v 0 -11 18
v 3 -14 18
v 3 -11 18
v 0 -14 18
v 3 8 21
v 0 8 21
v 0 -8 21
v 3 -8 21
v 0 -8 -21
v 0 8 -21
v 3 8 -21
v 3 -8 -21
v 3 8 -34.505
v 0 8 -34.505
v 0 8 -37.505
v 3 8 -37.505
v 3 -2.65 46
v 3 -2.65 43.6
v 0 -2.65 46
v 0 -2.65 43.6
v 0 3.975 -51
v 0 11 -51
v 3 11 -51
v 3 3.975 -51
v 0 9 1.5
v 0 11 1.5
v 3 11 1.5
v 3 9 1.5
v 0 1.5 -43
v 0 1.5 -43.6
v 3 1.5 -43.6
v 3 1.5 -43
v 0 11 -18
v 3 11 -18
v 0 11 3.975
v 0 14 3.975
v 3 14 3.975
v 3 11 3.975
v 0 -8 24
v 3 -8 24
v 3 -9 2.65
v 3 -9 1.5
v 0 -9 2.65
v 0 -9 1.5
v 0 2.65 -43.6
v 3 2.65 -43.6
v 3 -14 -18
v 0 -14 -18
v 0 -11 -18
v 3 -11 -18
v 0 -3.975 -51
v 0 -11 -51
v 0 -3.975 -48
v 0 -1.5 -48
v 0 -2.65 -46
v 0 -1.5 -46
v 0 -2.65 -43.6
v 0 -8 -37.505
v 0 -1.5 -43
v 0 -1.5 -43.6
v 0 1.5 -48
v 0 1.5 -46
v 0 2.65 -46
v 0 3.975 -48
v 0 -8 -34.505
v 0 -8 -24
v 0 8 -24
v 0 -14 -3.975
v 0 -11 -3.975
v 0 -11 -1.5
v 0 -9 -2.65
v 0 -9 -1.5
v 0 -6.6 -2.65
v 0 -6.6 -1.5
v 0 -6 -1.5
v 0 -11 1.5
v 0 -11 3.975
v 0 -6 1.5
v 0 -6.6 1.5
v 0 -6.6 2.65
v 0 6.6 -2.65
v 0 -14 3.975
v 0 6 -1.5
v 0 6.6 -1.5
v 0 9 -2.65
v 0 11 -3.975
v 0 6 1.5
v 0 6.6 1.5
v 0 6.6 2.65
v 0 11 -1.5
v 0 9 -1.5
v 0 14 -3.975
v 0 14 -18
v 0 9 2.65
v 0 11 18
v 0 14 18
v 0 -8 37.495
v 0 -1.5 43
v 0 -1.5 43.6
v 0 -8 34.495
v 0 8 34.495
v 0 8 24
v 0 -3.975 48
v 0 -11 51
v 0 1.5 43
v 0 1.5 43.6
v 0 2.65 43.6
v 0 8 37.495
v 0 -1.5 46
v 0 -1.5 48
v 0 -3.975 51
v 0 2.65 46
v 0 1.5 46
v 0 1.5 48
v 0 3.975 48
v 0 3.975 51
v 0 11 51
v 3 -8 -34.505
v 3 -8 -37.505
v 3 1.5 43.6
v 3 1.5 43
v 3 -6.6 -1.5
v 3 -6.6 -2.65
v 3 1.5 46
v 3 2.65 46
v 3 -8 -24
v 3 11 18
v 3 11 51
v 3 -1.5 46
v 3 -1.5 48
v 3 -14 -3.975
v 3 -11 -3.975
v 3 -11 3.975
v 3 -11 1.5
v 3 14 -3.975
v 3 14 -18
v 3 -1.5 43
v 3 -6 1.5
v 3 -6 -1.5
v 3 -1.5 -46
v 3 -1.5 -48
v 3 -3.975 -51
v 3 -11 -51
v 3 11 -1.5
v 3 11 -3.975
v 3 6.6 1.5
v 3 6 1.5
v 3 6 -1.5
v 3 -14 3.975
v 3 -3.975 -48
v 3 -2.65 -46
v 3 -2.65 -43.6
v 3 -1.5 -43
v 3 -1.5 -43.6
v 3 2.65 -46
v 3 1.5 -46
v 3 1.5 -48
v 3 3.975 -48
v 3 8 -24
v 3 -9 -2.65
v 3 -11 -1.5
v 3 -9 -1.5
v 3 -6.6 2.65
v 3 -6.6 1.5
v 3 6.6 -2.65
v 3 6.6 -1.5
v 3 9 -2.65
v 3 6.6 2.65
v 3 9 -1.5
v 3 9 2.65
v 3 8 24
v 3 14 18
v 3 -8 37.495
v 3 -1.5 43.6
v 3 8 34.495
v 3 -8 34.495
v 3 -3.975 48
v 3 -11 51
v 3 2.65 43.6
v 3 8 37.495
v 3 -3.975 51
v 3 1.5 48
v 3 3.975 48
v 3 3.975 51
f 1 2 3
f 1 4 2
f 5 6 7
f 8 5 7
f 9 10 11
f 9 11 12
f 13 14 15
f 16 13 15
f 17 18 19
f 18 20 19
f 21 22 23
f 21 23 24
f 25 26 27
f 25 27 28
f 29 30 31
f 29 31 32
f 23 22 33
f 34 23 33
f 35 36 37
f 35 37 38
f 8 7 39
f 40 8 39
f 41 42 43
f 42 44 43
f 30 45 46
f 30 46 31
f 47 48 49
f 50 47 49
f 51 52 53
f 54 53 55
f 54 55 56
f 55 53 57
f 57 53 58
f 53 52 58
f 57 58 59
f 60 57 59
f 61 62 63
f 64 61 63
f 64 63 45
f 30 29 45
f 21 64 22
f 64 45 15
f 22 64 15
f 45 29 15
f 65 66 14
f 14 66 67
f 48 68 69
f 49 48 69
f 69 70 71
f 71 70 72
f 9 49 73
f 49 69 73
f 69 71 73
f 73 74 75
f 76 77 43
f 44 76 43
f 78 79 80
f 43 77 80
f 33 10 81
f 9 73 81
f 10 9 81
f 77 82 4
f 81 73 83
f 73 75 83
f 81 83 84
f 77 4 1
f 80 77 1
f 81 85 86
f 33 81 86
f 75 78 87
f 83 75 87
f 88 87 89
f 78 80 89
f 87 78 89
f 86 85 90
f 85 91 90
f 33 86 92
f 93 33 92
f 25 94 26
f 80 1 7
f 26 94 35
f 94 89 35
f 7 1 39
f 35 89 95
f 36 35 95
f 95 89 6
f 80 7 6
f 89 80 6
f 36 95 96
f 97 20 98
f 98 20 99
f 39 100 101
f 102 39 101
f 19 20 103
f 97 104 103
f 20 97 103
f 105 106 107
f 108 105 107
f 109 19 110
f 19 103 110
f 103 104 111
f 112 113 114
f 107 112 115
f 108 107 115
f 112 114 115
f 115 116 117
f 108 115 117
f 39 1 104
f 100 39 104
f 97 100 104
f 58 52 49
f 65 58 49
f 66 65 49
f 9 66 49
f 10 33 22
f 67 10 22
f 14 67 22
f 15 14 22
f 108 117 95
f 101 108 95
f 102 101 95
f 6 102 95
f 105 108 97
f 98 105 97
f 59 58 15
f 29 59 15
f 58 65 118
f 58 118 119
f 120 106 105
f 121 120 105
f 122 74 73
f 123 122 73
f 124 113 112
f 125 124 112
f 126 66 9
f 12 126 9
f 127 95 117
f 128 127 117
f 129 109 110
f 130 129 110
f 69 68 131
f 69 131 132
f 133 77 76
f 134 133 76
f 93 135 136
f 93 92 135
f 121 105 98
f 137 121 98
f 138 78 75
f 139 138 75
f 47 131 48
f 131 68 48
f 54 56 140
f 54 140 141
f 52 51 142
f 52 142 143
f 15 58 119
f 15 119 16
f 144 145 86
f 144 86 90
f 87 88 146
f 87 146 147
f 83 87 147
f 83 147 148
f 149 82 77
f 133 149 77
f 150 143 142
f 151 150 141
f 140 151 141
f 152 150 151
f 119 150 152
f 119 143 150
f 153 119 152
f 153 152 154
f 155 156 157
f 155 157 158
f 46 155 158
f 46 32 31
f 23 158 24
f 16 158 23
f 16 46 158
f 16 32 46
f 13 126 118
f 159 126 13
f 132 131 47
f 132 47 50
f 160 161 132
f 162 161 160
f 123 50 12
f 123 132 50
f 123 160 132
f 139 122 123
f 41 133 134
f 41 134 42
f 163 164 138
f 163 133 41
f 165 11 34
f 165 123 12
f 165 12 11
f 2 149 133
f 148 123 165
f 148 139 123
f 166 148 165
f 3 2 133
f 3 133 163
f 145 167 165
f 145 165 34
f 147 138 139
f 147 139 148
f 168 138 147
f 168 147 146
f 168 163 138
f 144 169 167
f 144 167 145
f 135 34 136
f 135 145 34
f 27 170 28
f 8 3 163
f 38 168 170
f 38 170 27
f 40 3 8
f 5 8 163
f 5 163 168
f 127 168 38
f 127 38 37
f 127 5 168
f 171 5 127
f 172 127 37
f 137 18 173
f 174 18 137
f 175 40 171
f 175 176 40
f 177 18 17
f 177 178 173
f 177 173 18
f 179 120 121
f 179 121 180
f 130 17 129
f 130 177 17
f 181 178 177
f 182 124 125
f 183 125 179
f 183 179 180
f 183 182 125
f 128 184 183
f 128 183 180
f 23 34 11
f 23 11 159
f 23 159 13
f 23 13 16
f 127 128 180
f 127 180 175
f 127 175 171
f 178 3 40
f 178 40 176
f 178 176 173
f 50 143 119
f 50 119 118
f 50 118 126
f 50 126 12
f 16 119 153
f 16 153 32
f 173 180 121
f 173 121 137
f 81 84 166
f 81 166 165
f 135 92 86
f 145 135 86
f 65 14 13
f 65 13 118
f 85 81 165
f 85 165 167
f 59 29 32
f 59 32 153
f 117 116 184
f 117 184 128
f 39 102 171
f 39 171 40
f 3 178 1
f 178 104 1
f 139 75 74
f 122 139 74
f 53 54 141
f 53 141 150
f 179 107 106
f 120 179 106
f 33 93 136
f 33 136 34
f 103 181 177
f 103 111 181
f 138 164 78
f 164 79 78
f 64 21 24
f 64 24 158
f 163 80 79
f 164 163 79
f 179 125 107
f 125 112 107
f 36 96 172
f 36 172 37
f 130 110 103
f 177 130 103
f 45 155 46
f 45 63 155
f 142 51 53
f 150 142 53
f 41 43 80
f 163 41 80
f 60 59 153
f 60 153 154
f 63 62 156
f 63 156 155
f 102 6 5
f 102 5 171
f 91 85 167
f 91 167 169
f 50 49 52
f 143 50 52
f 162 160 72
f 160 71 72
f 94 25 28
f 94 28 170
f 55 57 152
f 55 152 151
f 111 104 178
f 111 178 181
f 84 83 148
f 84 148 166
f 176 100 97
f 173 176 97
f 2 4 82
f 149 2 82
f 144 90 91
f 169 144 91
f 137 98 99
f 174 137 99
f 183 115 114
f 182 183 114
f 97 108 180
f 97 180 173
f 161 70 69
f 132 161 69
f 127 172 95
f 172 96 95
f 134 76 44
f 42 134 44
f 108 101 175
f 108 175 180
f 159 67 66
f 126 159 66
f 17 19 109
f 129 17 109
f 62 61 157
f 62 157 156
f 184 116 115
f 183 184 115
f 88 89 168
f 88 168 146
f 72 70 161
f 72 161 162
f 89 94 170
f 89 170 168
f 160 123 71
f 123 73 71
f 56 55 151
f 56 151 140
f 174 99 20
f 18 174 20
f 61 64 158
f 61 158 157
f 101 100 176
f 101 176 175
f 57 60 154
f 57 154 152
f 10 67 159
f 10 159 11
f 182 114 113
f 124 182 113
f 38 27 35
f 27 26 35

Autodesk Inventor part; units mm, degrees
ref_plane "YZ Plane" through (0, 0, 0) normal (1, 0, 0) x (0, 1, 0)
ref_plane "XZ Plane" through (0, 0, 0) normal (0, 1, 0) x (-1, 0, 0)
ref_plane "XY Plane" through (0, 0, 0) normal (0, 0, 1) x (1, 0, 0)
sketch "Sketch2" plane through (0, 0, 0) normal (1, 0, 0) x (0, 1, 0)
  line L0 (14, -51) -> (11, -51)
  line L1 (-14, 51) -> (-11, 51)
  line L2 (14, 51) -> (14, 48)
  line L3 (-14, 51) -> (-14, 48)
  line L4 (14, -48) -> (11, -48)
  line L5 (11, -51) -> (11, -48)
  line L6 (0, -71.4) -> (0, 71.4) construction
  line L7 (3.975, -51) -> (3.975, -48)
  line L8 (-3.975, -51) -> (-3.975, -48)
  line L9 (1.5, -48) -> (1.5, -46)
  line L10 (1.5, -46) -> (2.65, -46)
  line L11 (2.65, -46) -> (2.65, -43.6)
  line L12 (2.65, -43.6) -> (1.5, -43.6)
  line L13 (1.5, -43.6) -> (1.5, -43)
  line L14 (1.5, -43) -> (-1.5, -43)
  line L15 (-1.5, -43) -> (-1.5, -43.6)
  line L16 (-1.5, -43.6) -> (-2.65, -43.6)
  line L17 (-2.65, -43.6) -> (-2.65, -46)
  line L18 (-2.65, -46) -> (-1.5, -46)
  line L19 (-1.5, -46) -> (-1.5, -48)
  line L20 (11, -51) -> (-14, -51)
  line L21 (1.5, -48) -> (-14, -48)
  line L22 (3.975, -48) -> (1.5, -48)
  line L23 (11, -48) -> (3.975, -48)
  line L24 (-23.2, 0) -> (41.2, 0) construction
  line L25 (-11, -51) -> (-11, -48)
  line L26 (14, 48) -> (11, 48)
  line L27 (11, 51) -> (11, 48)
  line L28 (3.975, 51) -> (3.975, 48)
  line L29 (-3.975, 51) -> (-3.975, 48)
  line L30 (1.5, 48) -> (1.5, 46)
  line L31 (1.5, 46) -> (2.65, 46)
  line L32 (2.65, 46) -> (2.65, 43.6)
  line L33 (2.65, 43.6) -> (1.5, 43.6)
  line L34 (1.5, 43.6) -> (1.5, 43)
  line L35 (1.5, 43) -> (-1.5, 43)
  line L36 (-1.5, 43) -> (-1.5, 43.6)
  line L37 (-1.5, 43.6) -> (-2.65, 43.6)
  line L38 (-2.65, 43.6) -> (-2.65, 46)
  line L39 (-2.65, 46) -> (-1.5, 46)
  line L40 (-1.5, 46) -> (-1.5, 48)
  line L41 (1.5, 48) -> (-14, 48)
  line L42 (3.975, 48) -> (1.5, 48)
  line L43 (11, 48) -> (3.975, 48)
  line L44 (-11, 51) -> (-11, 48)
  line L45 (3.975, 51) -> (11, 51)
  line L46 (-3.975, 51) -> (3.975, 51)
  line L47 (11, -48) -> (11, -1.5)
  line L48 (-11, 48) -> (-11, 18)
  line L49 (14, 21) -> (11, 21) construction
  line L50 (14, -21) -> (11, -21) construction
  line L51 (14, 18) -> (11, 18)
  line L52 (14, -18) -> (11, -18)
  line L53 (14, -3.975) -> (11, -3.975)
  line L54 (14, 3.975) -> (11, 3.975)
  line L55 (11, 1.5) -> (9, 1.5)
  line L56 (9, 1.5) -> (9, 2.65)
  line L57 (9, 2.65) -> (6.6, 2.65)
  line L58 (6.6, 2.65) -> (6.6, 1.5)
  line L59 (6.6, 1.5) -> (6, 1.5)
  line L60 (6, 1.5) -> (6, -1.5)
  line L61 (6, -1.5) -> (6.6, -1.5)
  line L62 (6.6, -1.5) -> (6.6, -2.65)
  line L63 (6.6, -2.65) -> (9, -2.65)
  line L64 (9, -2.65) -> (9, -1.5)
  line L65 (11, -1.5) -> (9, -1.5)
  line L66 (14, -3.975) -> (14, -18)
  line L67 (14, 3.975) -> (14, -3.975)
  line L68 (11, 1.5) -> (11, 48)
  line L69 (11, -1.5) -> (11, 1.5)
  line L70 (-14, 18) -> (-11, 18)
  line L71 (-14, -18) -> (-11, -18)
  line L72 (-14, -3.975) -> (-11, -3.975)
  line L73 (-14, 3.975) -> (-11, 3.975)
  line L74 (-11, 1.5) -> (-9, 1.5)
  line L75 (-9, 1.5) -> (-9, 2.65)
  line L76 (-9, 2.65) -> (-6.6, 2.65)
  line L77 (-6.6, 2.65) -> (-6.6, 1.5)
  line L78 (-6.6, 1.5) -> (-6, 1.5)
  line L79 (-6, 1.5) -> (-6, -1.5)
  line L80 (-6, -1.5) -> (-6.6, -1.5)
  line L81 (-6.6, -1.5) -> (-6.6, -2.65)
  line L82 (-6.6, -2.65) -> (-9, -2.65)
  line L83 (-9, -2.65) -> (-9, -1.5)
  line L84 (-11, -1.5) -> (-9, -1.5)
  line L85 (-14, 3.975) -> (-14, -3.975)
  line L86 (-14, -3.975) -> (-14, -18)
  line L87 (-14, 18) -> (-14, 3.975)
  line L88 (-14, -18) -> (-14, -51)
  line L89 (14, -18) -> (14, -51)
  line L90 (14, 18) -> (14, 3.975)
  line L91 (-11, -3.975) -> (-11, -18)
  line L92 (-11, -18) -> (-11, -48)
  line L93 (-11, 18) -> (-11, 3.975)
  line L94 (14, 48) -> (14, 18)
  line L95 (-14, 48) -> (-14, 18)
  line L96 (-11, 51) -> (-3.975, 51)
  line L97 (11, 51) -> (14, 51)
  line L98 (-11, 3.975) -> (-11, 1.5)
  line L99 (-11, 1.5) -> (-11, -1.5)
  line L100 (-11, -1.5) -> (-11, -3.975)
  line L101 (8, -34.5052) -> (8, -37.5052) projected
  line L102 (-8, -37.5052) -> (8, -37.5052) projected
  line L103 (-8, -34.5052) -> (-8, -37.5052) projected
  line L104 (8, -34.5052) -> (-8, -34.5052) projected
  line L105 (8, -24) -> (-8, -24) projected
  line L106 (-8, -24) -> (-8, -21) projected
  line L107 (8, -21) -> (-8, -21) projected
  line L108 (8, -24) -> (8, -21) projected
  line L109 (32, 21) -> (17, 21) projected
  line L110 (17, 21) -> (17, 24) projected
  line L111 (32, 24) -> (17, 24) projected
  line L112 (32, 21) -> (32, 24) projected
  line L113 (8, 21) -> (-8, 21) projected
  line L114 (-8, 21) -> (-8, 24) projected
  line L115 (8, 24) -> (-8, 24) projected
  line L116 (8, 21) -> (8, 24) projected
  line L117 (-8, 34.4948) -> (-8, 37.4948) projected
  line L118 (8, 37.4948) -> (-8, 37.4948) projected
  line L119 (8, 34.4948) -> (8, 37.4948) projected
  line L120 (-8, 34.4948) -> (8, 34.4948) projected
  point P0 (0, 0)
  dimension "d5" = 3
  dimension "d6" = 3
  dimension "d8" = 2.4
  dimension "d9" = 5.3
  dimension "d10" = 3
  dimension "d11" = 2
  dimension "d12" = 5
  dimension "d13" = 7.95
  dimension "d14" = 28
  dimension "d15" = 102
  dimension "d17" = 42
  dimension "d18" = 3
  dimension "d19" = 3
  dimension "d20" = 2
  dimension "d21" = 5
  dimension "d22" = 2.4
  dimension "d23" = 5.3
  dimension "d24" = 3
  dimension "d25" = 7.95
extrude "Extrusion1" add sketch "Sketch2" along normal blind 3 contours L20 L7 L23 L5 | L23 L22 L9 L10 L11 L12 L13 L14 L15 L16 L17 L18 L19 L21 L92 L91 L100 L84 L83 L82 L81 L80 L79 L78 L77 L76 L75 L74 L98 L93 L48 L41 L40 L39 L38 L37 L36 L35 L34 L33 L32 L31 L30 L42 L43 L68 L55 L56 L57 L58 L59 L60 L61 L62 L63 L64 L65 L47 | L52 L47 L53 L66 | L20 L25 L21 L8 | L54 L68 L51 L90 | L71 L86 L72 L91 | L43 L28 L45 L27 | L87 L70 L93 L73 | L29 L41 L44 L96
equation "\"d13\" = 1.5 * d9"
equation "\"d25\" = 1.5 * d23"
properties part number "Bearing-Side"
